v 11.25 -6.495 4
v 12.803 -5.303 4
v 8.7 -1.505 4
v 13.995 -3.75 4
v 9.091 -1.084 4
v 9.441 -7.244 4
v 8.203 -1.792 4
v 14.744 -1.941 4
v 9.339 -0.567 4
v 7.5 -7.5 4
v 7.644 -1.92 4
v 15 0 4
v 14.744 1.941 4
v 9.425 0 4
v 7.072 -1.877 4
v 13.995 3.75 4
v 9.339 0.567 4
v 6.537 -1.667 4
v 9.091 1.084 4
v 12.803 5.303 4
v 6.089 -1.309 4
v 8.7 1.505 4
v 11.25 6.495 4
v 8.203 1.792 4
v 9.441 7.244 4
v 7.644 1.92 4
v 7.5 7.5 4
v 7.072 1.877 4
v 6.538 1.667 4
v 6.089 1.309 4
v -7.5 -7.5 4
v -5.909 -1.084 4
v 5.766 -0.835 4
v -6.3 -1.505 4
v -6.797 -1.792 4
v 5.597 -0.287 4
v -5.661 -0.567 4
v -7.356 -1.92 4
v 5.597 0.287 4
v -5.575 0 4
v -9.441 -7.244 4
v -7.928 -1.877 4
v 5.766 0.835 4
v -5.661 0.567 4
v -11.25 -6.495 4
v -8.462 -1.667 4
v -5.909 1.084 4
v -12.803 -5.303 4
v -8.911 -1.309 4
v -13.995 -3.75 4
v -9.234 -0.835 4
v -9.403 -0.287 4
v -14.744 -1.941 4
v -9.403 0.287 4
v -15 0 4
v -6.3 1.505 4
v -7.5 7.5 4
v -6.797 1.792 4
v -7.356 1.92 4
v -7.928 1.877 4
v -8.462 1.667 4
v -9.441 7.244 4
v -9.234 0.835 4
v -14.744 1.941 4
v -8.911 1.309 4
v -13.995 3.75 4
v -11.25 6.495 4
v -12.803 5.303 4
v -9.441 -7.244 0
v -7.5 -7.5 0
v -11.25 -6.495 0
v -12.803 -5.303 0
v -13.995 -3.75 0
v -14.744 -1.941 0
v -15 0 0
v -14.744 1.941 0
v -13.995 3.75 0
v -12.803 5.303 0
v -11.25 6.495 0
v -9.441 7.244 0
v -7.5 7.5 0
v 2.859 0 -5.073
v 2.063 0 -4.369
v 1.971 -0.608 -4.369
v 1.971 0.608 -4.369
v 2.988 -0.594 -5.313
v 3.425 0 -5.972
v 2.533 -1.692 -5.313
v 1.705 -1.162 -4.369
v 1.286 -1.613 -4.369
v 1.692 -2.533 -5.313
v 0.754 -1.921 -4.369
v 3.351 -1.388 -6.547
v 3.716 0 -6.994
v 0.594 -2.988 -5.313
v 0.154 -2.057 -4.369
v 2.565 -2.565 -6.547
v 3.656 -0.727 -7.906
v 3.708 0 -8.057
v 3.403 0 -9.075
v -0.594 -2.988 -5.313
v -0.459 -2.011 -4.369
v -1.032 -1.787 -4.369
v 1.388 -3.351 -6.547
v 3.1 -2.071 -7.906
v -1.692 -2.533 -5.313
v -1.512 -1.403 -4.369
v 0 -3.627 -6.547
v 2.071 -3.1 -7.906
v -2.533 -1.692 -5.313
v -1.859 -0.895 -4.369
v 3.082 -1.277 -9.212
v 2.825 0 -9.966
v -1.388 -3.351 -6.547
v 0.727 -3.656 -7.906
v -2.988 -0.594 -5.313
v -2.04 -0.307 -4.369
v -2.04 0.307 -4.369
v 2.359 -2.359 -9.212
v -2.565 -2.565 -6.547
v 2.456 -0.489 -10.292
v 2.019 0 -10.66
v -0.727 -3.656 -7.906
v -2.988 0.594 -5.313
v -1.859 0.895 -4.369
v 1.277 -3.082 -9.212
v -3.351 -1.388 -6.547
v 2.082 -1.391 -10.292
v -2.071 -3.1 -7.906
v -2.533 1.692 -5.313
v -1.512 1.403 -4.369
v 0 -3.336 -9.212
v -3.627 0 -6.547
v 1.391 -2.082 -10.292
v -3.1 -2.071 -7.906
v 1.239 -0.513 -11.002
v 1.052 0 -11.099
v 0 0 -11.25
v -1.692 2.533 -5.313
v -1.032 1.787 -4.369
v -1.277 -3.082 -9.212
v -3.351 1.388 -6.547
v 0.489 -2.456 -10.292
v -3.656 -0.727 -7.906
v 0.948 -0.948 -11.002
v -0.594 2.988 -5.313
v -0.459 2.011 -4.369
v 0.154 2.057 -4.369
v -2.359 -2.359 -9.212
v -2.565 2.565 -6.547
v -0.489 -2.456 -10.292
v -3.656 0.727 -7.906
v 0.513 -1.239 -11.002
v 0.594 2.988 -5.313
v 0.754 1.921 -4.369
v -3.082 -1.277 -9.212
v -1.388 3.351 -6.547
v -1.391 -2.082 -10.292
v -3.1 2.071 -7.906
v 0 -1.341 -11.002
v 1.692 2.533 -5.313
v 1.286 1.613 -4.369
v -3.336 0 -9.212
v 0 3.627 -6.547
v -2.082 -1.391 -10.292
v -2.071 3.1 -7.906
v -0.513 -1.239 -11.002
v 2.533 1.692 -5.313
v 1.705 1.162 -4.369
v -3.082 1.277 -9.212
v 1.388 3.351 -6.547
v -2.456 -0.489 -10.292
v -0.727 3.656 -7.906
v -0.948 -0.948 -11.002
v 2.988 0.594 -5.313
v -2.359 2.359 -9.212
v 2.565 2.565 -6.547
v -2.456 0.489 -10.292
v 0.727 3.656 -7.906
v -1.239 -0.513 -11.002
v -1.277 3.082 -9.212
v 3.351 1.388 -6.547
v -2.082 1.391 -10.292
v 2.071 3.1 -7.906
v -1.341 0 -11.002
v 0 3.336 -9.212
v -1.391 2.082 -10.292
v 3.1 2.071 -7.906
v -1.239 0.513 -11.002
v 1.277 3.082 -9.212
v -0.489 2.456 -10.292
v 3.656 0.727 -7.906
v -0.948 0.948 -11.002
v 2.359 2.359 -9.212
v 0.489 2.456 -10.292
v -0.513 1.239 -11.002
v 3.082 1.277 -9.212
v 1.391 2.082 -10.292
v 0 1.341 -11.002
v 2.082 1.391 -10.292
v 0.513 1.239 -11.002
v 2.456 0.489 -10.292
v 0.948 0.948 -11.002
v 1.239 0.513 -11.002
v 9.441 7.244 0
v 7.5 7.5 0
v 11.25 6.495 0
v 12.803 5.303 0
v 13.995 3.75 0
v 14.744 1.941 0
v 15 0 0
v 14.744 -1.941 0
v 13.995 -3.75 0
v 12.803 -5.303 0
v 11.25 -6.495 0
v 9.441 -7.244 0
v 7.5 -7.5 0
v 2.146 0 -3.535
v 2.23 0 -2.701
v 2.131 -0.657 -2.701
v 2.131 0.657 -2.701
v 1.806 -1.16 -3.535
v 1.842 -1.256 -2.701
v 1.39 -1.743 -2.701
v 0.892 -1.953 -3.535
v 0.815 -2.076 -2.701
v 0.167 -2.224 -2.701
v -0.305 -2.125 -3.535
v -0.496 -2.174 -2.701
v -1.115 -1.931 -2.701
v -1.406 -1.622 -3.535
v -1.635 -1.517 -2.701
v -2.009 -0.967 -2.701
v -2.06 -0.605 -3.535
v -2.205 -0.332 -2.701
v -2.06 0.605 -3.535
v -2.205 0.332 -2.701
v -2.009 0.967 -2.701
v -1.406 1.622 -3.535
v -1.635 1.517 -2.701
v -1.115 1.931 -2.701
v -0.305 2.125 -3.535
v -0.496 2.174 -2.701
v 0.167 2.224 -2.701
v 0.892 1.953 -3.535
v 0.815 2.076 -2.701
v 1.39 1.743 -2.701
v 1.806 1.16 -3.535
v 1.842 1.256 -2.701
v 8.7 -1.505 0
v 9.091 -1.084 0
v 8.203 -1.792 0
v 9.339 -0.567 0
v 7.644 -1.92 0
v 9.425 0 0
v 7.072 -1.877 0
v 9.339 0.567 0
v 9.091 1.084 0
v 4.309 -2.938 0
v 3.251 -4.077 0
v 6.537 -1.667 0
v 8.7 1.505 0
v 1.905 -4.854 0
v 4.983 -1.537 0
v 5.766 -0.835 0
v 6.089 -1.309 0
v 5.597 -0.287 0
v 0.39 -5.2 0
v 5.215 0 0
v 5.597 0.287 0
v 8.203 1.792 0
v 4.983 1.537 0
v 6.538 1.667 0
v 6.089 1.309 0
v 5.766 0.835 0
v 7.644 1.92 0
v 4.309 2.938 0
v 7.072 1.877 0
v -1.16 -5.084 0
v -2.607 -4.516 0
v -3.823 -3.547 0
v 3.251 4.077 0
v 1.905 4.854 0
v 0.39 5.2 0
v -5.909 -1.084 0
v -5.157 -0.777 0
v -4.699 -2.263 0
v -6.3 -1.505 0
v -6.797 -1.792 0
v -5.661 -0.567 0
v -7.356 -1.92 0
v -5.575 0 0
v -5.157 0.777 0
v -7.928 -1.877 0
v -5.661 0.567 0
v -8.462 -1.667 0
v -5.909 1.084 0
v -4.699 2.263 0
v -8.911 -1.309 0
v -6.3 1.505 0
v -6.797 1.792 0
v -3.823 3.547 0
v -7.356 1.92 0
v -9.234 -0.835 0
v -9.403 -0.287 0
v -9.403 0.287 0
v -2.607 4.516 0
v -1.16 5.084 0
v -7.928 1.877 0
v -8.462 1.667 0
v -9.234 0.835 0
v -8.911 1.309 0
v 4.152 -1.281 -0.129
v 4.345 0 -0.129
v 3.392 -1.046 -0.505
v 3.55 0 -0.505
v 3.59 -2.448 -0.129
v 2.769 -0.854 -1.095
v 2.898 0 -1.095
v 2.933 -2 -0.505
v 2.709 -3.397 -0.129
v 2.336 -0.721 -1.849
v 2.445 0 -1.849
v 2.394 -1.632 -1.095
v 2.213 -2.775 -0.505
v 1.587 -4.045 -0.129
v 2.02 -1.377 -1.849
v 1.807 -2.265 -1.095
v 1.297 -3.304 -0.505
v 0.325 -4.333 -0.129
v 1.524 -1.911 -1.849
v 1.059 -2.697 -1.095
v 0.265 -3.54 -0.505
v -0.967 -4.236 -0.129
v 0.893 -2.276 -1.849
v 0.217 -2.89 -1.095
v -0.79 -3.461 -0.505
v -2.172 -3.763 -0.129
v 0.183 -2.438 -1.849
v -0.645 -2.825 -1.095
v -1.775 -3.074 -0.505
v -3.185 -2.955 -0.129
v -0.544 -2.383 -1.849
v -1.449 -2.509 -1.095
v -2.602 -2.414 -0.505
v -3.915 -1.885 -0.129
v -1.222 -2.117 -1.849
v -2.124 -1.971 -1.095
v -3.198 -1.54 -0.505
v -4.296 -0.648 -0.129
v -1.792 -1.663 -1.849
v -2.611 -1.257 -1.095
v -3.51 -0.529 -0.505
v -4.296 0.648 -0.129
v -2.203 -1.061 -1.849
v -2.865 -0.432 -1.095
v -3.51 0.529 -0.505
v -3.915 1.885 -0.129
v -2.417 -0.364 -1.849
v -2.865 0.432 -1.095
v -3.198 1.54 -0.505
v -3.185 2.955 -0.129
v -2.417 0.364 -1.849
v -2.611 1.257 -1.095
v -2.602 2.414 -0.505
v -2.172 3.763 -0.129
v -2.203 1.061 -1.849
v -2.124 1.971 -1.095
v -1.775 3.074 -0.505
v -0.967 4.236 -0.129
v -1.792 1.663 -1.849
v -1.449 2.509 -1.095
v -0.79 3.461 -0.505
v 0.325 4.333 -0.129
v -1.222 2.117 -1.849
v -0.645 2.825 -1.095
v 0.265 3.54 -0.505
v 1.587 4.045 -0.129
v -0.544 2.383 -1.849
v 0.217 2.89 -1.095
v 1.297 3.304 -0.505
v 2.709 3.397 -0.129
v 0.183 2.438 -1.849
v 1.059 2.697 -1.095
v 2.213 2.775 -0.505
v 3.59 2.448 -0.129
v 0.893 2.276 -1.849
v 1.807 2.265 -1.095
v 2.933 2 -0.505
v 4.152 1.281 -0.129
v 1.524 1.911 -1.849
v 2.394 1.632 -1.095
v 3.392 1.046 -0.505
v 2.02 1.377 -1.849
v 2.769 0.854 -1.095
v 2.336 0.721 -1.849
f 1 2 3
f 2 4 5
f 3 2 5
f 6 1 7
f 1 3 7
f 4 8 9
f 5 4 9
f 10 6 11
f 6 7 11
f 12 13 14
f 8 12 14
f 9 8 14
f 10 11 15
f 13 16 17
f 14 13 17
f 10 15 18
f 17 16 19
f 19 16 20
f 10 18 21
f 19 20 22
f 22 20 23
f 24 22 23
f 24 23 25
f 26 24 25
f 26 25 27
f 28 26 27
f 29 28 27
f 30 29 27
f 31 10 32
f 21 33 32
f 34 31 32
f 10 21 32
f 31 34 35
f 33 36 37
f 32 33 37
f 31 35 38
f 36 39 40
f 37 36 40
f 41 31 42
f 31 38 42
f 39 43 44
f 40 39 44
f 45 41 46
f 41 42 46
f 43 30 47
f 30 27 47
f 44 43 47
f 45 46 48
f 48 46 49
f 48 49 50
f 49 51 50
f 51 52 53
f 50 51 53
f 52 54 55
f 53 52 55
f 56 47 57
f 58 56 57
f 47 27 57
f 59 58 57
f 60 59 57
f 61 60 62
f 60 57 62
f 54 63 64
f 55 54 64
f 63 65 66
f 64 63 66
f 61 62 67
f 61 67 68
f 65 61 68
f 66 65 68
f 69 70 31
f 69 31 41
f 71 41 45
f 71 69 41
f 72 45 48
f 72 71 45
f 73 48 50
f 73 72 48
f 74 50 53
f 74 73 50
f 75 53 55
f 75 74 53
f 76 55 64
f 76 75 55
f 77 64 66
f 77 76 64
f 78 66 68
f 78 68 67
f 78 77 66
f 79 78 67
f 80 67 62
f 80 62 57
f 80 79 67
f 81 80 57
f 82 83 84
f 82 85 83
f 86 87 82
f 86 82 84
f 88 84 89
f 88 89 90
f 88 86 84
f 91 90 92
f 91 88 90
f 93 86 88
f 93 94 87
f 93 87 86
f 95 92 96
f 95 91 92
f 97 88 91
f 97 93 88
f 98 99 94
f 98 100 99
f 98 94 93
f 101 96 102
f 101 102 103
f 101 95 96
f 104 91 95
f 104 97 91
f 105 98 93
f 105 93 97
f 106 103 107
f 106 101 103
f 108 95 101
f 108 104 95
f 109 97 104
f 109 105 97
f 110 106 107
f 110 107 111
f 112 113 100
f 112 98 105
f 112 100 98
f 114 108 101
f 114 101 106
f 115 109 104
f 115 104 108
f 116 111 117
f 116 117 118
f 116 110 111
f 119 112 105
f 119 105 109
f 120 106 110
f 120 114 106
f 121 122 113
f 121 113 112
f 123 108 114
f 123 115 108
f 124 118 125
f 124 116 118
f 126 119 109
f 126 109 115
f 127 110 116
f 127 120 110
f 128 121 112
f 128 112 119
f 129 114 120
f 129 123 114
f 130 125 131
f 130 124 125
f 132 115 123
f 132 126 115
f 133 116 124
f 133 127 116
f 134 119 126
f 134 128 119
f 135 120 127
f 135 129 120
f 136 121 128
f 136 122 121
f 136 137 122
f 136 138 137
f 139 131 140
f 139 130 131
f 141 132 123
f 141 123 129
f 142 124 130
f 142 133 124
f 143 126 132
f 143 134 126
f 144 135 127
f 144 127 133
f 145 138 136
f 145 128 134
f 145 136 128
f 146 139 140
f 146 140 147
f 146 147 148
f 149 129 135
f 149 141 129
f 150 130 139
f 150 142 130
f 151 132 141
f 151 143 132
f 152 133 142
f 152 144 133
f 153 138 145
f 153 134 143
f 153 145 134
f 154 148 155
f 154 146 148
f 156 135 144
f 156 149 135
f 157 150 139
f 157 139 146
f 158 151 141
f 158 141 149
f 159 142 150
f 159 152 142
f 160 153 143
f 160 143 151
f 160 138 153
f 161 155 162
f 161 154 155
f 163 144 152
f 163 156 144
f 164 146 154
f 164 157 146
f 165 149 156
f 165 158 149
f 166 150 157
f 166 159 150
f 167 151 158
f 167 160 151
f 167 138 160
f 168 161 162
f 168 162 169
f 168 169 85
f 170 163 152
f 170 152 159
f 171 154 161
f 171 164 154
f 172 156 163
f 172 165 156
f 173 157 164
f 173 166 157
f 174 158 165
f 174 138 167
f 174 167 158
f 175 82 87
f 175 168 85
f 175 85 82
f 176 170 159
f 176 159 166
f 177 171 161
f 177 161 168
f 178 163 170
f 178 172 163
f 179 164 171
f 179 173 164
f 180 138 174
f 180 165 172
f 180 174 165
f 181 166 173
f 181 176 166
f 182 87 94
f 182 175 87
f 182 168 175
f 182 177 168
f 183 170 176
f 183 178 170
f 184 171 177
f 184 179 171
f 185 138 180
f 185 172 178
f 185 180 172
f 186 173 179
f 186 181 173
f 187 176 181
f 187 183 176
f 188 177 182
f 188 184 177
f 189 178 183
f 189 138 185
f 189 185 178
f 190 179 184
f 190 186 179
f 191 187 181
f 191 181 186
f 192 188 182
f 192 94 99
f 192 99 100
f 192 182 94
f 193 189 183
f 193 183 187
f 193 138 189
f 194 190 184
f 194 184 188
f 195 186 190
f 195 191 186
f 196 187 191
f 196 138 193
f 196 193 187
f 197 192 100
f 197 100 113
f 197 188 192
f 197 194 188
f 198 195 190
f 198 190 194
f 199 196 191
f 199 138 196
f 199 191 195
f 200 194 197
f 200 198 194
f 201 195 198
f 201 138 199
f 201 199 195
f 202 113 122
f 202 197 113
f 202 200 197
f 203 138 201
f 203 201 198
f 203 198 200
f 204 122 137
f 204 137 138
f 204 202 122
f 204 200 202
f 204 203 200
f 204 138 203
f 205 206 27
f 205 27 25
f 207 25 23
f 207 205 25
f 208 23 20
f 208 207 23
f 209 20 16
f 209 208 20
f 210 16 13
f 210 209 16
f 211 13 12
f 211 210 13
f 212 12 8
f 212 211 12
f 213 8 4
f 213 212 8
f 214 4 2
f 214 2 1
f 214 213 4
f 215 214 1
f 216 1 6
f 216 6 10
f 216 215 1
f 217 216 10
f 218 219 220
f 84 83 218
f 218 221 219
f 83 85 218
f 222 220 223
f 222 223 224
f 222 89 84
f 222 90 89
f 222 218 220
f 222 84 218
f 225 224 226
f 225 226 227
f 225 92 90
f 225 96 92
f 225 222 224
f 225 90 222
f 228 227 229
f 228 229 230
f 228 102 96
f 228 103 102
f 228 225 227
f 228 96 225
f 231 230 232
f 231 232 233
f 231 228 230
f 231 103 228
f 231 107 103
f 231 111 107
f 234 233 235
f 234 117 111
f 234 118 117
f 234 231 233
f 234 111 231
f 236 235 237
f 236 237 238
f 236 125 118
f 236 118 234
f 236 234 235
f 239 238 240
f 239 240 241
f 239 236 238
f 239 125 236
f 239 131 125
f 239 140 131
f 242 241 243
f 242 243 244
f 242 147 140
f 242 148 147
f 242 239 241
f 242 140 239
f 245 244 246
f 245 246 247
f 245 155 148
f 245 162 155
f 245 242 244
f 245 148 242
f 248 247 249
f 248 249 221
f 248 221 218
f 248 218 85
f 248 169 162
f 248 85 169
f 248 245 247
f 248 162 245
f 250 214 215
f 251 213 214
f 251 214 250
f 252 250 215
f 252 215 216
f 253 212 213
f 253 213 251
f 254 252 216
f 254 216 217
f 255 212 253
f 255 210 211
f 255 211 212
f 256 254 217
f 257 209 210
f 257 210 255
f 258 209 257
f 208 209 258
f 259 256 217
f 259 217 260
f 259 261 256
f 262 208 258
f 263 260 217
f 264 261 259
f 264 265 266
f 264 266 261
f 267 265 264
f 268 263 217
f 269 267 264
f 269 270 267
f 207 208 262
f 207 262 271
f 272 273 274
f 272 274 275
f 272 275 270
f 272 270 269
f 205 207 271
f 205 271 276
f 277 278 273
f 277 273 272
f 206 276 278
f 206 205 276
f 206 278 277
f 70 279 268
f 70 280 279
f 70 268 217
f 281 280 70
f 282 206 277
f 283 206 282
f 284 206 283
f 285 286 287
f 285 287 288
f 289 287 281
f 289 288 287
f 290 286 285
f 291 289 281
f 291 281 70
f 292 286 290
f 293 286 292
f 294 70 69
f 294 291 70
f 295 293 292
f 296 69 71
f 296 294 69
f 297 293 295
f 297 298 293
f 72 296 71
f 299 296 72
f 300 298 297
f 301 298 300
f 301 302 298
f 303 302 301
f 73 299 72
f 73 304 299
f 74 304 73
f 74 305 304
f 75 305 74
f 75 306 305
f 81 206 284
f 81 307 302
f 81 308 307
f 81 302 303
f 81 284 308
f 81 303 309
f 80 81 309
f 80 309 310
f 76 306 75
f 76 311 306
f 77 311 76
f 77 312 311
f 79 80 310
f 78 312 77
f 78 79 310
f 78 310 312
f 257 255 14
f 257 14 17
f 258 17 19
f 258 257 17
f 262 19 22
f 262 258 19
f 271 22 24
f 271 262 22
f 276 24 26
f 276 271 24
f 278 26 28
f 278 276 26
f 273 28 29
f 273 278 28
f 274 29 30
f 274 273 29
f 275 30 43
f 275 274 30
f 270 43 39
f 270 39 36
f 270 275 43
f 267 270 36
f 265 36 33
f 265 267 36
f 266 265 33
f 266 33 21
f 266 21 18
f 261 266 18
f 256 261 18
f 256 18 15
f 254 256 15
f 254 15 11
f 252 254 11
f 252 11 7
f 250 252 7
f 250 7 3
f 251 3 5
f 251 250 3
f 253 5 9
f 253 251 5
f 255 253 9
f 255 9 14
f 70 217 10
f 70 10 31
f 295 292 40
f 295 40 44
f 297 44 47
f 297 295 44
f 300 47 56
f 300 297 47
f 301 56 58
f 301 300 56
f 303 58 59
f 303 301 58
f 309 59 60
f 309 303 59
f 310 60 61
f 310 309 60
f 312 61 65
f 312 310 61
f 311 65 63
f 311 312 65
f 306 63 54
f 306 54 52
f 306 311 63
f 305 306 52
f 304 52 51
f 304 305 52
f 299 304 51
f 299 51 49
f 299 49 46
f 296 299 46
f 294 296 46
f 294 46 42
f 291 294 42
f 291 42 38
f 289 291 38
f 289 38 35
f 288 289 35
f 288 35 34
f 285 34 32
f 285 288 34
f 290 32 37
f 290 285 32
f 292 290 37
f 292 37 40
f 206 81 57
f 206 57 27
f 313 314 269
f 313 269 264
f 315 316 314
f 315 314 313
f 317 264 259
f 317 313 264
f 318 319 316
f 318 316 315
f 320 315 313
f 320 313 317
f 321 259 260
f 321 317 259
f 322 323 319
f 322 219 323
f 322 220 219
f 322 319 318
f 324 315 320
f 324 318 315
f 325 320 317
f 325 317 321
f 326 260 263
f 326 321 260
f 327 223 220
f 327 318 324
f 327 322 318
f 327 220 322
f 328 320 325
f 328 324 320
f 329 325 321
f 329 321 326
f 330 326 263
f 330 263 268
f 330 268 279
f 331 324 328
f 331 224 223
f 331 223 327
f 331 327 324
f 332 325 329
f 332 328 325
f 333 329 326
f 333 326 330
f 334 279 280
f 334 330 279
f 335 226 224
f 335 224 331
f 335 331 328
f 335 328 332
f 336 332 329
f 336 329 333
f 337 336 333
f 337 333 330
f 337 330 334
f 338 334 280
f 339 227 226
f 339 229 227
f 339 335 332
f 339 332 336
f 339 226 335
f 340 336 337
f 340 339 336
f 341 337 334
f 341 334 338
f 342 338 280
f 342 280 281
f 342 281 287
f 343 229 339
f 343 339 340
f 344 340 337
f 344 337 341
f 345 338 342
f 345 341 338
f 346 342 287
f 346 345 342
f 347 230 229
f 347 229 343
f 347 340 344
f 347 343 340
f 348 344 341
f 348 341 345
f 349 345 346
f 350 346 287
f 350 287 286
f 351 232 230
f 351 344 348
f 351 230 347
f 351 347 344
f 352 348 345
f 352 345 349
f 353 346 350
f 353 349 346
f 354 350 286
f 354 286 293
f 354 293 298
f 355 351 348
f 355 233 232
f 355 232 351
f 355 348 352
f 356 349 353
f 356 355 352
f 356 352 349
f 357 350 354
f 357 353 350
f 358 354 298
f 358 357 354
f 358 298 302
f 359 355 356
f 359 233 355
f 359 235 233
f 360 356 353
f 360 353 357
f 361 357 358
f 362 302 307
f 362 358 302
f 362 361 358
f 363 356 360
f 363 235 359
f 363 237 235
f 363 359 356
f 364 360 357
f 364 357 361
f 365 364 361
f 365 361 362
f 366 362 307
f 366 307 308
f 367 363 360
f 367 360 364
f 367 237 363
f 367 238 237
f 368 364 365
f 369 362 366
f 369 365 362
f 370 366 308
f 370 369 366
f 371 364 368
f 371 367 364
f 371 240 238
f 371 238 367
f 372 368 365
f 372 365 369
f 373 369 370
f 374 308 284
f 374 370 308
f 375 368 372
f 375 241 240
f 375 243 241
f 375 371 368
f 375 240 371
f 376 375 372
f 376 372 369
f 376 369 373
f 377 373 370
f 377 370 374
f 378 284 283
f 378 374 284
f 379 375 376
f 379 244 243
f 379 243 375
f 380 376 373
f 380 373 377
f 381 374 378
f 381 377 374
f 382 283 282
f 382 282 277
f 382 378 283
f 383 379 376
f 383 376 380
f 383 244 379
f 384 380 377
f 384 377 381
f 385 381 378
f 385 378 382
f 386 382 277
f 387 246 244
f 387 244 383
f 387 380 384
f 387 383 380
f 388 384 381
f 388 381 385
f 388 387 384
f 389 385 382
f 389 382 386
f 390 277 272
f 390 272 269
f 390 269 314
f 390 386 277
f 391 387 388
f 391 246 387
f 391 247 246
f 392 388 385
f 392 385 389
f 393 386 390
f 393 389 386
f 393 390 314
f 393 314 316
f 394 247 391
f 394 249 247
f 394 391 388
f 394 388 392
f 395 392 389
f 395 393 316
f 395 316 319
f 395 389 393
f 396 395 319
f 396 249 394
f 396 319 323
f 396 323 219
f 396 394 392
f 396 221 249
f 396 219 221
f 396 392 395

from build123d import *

# Parameters (mm, degrees)
SKETCH1_R           = 1.925
BOSS_EXTRUDE1_DEPTH = 4
FILLET1_R           = 3


with BuildPart() as part:
    # Sketch1 → Boss-Extrude1 (new body)
    with BuildSketch(Plane.XY):
        with BuildLine():
            Line((-7.5, 7.5), (7.5, 7.5))
            ThreePointArc((7.5, 7.5), (15, 0), (7.5, -7.5))
            Line((7.5, -7.5), (-7.5, -7.5))
            ThreePointArc((-7.5, -7.5), (-15, 0), (-7.5, 7.5))
        make_face()
        with Locations((7.5, 0)):
            Circle(SKETCH1_R, mode=Mode.SUBTRACT)
        with Locations((-7.5, 0)):
            Circle(SKETCH1_R, mode=Mode.SUBTRACT)
    extrude(amount=BOSS_EXTRUDE1_DEPTH)

    # Sketch3 → Revolve1 (revolve)
    with BuildSketch(Plane(origin=(0, 0, 0), x_dir=(1, 0, 0), z_dir=(0, 1, 0))):
        with BuildLine():
            Line((0, 11.25), (0, 7.5))
            Line((0, 7.5), (1.75, 7.5))
            Line((1.75, 7.5), (2.063144305, 4.36855695))
            ThreePointArc((2.063144305, 4.36855695), (3.592033647, 8.576937454), (0, 11.25))
        make_face()
        with BuildLine():
            Line((1.75, 7.5), (0, 7.5))
            Line((0, 7.5), (0, 3.75))
            ThreePointArc((0, 3.75), (1.076937454, 3.907966353), (2.063144305, 4.36855695))
            Line((2.063144305, 4.36855695), (1.75, 7.5))
        make_face()
        with BuildLine():
            ThreePointArc((2.063144305, 4.36855695), (1.076937454, 3.907966353), (0, 3.75))
            Line((0, 3.75), (0, 0))
            Line((0, 0), (2.5, 0))
            Line((2.5, 0), (2.063144305, 4.36855695))
        make_face()
    revolve(axis=Axis((0, 0, 0), (0, 0, -1)))

    # Fillet1
    fillet1_edges = [part.edges().sort_by_distance(p)[0] for p in [
        (-2.5, 0, 0),
    ]]
    fillet(fillet1_edges, radius=FILLET1_R)


solid = part.part
